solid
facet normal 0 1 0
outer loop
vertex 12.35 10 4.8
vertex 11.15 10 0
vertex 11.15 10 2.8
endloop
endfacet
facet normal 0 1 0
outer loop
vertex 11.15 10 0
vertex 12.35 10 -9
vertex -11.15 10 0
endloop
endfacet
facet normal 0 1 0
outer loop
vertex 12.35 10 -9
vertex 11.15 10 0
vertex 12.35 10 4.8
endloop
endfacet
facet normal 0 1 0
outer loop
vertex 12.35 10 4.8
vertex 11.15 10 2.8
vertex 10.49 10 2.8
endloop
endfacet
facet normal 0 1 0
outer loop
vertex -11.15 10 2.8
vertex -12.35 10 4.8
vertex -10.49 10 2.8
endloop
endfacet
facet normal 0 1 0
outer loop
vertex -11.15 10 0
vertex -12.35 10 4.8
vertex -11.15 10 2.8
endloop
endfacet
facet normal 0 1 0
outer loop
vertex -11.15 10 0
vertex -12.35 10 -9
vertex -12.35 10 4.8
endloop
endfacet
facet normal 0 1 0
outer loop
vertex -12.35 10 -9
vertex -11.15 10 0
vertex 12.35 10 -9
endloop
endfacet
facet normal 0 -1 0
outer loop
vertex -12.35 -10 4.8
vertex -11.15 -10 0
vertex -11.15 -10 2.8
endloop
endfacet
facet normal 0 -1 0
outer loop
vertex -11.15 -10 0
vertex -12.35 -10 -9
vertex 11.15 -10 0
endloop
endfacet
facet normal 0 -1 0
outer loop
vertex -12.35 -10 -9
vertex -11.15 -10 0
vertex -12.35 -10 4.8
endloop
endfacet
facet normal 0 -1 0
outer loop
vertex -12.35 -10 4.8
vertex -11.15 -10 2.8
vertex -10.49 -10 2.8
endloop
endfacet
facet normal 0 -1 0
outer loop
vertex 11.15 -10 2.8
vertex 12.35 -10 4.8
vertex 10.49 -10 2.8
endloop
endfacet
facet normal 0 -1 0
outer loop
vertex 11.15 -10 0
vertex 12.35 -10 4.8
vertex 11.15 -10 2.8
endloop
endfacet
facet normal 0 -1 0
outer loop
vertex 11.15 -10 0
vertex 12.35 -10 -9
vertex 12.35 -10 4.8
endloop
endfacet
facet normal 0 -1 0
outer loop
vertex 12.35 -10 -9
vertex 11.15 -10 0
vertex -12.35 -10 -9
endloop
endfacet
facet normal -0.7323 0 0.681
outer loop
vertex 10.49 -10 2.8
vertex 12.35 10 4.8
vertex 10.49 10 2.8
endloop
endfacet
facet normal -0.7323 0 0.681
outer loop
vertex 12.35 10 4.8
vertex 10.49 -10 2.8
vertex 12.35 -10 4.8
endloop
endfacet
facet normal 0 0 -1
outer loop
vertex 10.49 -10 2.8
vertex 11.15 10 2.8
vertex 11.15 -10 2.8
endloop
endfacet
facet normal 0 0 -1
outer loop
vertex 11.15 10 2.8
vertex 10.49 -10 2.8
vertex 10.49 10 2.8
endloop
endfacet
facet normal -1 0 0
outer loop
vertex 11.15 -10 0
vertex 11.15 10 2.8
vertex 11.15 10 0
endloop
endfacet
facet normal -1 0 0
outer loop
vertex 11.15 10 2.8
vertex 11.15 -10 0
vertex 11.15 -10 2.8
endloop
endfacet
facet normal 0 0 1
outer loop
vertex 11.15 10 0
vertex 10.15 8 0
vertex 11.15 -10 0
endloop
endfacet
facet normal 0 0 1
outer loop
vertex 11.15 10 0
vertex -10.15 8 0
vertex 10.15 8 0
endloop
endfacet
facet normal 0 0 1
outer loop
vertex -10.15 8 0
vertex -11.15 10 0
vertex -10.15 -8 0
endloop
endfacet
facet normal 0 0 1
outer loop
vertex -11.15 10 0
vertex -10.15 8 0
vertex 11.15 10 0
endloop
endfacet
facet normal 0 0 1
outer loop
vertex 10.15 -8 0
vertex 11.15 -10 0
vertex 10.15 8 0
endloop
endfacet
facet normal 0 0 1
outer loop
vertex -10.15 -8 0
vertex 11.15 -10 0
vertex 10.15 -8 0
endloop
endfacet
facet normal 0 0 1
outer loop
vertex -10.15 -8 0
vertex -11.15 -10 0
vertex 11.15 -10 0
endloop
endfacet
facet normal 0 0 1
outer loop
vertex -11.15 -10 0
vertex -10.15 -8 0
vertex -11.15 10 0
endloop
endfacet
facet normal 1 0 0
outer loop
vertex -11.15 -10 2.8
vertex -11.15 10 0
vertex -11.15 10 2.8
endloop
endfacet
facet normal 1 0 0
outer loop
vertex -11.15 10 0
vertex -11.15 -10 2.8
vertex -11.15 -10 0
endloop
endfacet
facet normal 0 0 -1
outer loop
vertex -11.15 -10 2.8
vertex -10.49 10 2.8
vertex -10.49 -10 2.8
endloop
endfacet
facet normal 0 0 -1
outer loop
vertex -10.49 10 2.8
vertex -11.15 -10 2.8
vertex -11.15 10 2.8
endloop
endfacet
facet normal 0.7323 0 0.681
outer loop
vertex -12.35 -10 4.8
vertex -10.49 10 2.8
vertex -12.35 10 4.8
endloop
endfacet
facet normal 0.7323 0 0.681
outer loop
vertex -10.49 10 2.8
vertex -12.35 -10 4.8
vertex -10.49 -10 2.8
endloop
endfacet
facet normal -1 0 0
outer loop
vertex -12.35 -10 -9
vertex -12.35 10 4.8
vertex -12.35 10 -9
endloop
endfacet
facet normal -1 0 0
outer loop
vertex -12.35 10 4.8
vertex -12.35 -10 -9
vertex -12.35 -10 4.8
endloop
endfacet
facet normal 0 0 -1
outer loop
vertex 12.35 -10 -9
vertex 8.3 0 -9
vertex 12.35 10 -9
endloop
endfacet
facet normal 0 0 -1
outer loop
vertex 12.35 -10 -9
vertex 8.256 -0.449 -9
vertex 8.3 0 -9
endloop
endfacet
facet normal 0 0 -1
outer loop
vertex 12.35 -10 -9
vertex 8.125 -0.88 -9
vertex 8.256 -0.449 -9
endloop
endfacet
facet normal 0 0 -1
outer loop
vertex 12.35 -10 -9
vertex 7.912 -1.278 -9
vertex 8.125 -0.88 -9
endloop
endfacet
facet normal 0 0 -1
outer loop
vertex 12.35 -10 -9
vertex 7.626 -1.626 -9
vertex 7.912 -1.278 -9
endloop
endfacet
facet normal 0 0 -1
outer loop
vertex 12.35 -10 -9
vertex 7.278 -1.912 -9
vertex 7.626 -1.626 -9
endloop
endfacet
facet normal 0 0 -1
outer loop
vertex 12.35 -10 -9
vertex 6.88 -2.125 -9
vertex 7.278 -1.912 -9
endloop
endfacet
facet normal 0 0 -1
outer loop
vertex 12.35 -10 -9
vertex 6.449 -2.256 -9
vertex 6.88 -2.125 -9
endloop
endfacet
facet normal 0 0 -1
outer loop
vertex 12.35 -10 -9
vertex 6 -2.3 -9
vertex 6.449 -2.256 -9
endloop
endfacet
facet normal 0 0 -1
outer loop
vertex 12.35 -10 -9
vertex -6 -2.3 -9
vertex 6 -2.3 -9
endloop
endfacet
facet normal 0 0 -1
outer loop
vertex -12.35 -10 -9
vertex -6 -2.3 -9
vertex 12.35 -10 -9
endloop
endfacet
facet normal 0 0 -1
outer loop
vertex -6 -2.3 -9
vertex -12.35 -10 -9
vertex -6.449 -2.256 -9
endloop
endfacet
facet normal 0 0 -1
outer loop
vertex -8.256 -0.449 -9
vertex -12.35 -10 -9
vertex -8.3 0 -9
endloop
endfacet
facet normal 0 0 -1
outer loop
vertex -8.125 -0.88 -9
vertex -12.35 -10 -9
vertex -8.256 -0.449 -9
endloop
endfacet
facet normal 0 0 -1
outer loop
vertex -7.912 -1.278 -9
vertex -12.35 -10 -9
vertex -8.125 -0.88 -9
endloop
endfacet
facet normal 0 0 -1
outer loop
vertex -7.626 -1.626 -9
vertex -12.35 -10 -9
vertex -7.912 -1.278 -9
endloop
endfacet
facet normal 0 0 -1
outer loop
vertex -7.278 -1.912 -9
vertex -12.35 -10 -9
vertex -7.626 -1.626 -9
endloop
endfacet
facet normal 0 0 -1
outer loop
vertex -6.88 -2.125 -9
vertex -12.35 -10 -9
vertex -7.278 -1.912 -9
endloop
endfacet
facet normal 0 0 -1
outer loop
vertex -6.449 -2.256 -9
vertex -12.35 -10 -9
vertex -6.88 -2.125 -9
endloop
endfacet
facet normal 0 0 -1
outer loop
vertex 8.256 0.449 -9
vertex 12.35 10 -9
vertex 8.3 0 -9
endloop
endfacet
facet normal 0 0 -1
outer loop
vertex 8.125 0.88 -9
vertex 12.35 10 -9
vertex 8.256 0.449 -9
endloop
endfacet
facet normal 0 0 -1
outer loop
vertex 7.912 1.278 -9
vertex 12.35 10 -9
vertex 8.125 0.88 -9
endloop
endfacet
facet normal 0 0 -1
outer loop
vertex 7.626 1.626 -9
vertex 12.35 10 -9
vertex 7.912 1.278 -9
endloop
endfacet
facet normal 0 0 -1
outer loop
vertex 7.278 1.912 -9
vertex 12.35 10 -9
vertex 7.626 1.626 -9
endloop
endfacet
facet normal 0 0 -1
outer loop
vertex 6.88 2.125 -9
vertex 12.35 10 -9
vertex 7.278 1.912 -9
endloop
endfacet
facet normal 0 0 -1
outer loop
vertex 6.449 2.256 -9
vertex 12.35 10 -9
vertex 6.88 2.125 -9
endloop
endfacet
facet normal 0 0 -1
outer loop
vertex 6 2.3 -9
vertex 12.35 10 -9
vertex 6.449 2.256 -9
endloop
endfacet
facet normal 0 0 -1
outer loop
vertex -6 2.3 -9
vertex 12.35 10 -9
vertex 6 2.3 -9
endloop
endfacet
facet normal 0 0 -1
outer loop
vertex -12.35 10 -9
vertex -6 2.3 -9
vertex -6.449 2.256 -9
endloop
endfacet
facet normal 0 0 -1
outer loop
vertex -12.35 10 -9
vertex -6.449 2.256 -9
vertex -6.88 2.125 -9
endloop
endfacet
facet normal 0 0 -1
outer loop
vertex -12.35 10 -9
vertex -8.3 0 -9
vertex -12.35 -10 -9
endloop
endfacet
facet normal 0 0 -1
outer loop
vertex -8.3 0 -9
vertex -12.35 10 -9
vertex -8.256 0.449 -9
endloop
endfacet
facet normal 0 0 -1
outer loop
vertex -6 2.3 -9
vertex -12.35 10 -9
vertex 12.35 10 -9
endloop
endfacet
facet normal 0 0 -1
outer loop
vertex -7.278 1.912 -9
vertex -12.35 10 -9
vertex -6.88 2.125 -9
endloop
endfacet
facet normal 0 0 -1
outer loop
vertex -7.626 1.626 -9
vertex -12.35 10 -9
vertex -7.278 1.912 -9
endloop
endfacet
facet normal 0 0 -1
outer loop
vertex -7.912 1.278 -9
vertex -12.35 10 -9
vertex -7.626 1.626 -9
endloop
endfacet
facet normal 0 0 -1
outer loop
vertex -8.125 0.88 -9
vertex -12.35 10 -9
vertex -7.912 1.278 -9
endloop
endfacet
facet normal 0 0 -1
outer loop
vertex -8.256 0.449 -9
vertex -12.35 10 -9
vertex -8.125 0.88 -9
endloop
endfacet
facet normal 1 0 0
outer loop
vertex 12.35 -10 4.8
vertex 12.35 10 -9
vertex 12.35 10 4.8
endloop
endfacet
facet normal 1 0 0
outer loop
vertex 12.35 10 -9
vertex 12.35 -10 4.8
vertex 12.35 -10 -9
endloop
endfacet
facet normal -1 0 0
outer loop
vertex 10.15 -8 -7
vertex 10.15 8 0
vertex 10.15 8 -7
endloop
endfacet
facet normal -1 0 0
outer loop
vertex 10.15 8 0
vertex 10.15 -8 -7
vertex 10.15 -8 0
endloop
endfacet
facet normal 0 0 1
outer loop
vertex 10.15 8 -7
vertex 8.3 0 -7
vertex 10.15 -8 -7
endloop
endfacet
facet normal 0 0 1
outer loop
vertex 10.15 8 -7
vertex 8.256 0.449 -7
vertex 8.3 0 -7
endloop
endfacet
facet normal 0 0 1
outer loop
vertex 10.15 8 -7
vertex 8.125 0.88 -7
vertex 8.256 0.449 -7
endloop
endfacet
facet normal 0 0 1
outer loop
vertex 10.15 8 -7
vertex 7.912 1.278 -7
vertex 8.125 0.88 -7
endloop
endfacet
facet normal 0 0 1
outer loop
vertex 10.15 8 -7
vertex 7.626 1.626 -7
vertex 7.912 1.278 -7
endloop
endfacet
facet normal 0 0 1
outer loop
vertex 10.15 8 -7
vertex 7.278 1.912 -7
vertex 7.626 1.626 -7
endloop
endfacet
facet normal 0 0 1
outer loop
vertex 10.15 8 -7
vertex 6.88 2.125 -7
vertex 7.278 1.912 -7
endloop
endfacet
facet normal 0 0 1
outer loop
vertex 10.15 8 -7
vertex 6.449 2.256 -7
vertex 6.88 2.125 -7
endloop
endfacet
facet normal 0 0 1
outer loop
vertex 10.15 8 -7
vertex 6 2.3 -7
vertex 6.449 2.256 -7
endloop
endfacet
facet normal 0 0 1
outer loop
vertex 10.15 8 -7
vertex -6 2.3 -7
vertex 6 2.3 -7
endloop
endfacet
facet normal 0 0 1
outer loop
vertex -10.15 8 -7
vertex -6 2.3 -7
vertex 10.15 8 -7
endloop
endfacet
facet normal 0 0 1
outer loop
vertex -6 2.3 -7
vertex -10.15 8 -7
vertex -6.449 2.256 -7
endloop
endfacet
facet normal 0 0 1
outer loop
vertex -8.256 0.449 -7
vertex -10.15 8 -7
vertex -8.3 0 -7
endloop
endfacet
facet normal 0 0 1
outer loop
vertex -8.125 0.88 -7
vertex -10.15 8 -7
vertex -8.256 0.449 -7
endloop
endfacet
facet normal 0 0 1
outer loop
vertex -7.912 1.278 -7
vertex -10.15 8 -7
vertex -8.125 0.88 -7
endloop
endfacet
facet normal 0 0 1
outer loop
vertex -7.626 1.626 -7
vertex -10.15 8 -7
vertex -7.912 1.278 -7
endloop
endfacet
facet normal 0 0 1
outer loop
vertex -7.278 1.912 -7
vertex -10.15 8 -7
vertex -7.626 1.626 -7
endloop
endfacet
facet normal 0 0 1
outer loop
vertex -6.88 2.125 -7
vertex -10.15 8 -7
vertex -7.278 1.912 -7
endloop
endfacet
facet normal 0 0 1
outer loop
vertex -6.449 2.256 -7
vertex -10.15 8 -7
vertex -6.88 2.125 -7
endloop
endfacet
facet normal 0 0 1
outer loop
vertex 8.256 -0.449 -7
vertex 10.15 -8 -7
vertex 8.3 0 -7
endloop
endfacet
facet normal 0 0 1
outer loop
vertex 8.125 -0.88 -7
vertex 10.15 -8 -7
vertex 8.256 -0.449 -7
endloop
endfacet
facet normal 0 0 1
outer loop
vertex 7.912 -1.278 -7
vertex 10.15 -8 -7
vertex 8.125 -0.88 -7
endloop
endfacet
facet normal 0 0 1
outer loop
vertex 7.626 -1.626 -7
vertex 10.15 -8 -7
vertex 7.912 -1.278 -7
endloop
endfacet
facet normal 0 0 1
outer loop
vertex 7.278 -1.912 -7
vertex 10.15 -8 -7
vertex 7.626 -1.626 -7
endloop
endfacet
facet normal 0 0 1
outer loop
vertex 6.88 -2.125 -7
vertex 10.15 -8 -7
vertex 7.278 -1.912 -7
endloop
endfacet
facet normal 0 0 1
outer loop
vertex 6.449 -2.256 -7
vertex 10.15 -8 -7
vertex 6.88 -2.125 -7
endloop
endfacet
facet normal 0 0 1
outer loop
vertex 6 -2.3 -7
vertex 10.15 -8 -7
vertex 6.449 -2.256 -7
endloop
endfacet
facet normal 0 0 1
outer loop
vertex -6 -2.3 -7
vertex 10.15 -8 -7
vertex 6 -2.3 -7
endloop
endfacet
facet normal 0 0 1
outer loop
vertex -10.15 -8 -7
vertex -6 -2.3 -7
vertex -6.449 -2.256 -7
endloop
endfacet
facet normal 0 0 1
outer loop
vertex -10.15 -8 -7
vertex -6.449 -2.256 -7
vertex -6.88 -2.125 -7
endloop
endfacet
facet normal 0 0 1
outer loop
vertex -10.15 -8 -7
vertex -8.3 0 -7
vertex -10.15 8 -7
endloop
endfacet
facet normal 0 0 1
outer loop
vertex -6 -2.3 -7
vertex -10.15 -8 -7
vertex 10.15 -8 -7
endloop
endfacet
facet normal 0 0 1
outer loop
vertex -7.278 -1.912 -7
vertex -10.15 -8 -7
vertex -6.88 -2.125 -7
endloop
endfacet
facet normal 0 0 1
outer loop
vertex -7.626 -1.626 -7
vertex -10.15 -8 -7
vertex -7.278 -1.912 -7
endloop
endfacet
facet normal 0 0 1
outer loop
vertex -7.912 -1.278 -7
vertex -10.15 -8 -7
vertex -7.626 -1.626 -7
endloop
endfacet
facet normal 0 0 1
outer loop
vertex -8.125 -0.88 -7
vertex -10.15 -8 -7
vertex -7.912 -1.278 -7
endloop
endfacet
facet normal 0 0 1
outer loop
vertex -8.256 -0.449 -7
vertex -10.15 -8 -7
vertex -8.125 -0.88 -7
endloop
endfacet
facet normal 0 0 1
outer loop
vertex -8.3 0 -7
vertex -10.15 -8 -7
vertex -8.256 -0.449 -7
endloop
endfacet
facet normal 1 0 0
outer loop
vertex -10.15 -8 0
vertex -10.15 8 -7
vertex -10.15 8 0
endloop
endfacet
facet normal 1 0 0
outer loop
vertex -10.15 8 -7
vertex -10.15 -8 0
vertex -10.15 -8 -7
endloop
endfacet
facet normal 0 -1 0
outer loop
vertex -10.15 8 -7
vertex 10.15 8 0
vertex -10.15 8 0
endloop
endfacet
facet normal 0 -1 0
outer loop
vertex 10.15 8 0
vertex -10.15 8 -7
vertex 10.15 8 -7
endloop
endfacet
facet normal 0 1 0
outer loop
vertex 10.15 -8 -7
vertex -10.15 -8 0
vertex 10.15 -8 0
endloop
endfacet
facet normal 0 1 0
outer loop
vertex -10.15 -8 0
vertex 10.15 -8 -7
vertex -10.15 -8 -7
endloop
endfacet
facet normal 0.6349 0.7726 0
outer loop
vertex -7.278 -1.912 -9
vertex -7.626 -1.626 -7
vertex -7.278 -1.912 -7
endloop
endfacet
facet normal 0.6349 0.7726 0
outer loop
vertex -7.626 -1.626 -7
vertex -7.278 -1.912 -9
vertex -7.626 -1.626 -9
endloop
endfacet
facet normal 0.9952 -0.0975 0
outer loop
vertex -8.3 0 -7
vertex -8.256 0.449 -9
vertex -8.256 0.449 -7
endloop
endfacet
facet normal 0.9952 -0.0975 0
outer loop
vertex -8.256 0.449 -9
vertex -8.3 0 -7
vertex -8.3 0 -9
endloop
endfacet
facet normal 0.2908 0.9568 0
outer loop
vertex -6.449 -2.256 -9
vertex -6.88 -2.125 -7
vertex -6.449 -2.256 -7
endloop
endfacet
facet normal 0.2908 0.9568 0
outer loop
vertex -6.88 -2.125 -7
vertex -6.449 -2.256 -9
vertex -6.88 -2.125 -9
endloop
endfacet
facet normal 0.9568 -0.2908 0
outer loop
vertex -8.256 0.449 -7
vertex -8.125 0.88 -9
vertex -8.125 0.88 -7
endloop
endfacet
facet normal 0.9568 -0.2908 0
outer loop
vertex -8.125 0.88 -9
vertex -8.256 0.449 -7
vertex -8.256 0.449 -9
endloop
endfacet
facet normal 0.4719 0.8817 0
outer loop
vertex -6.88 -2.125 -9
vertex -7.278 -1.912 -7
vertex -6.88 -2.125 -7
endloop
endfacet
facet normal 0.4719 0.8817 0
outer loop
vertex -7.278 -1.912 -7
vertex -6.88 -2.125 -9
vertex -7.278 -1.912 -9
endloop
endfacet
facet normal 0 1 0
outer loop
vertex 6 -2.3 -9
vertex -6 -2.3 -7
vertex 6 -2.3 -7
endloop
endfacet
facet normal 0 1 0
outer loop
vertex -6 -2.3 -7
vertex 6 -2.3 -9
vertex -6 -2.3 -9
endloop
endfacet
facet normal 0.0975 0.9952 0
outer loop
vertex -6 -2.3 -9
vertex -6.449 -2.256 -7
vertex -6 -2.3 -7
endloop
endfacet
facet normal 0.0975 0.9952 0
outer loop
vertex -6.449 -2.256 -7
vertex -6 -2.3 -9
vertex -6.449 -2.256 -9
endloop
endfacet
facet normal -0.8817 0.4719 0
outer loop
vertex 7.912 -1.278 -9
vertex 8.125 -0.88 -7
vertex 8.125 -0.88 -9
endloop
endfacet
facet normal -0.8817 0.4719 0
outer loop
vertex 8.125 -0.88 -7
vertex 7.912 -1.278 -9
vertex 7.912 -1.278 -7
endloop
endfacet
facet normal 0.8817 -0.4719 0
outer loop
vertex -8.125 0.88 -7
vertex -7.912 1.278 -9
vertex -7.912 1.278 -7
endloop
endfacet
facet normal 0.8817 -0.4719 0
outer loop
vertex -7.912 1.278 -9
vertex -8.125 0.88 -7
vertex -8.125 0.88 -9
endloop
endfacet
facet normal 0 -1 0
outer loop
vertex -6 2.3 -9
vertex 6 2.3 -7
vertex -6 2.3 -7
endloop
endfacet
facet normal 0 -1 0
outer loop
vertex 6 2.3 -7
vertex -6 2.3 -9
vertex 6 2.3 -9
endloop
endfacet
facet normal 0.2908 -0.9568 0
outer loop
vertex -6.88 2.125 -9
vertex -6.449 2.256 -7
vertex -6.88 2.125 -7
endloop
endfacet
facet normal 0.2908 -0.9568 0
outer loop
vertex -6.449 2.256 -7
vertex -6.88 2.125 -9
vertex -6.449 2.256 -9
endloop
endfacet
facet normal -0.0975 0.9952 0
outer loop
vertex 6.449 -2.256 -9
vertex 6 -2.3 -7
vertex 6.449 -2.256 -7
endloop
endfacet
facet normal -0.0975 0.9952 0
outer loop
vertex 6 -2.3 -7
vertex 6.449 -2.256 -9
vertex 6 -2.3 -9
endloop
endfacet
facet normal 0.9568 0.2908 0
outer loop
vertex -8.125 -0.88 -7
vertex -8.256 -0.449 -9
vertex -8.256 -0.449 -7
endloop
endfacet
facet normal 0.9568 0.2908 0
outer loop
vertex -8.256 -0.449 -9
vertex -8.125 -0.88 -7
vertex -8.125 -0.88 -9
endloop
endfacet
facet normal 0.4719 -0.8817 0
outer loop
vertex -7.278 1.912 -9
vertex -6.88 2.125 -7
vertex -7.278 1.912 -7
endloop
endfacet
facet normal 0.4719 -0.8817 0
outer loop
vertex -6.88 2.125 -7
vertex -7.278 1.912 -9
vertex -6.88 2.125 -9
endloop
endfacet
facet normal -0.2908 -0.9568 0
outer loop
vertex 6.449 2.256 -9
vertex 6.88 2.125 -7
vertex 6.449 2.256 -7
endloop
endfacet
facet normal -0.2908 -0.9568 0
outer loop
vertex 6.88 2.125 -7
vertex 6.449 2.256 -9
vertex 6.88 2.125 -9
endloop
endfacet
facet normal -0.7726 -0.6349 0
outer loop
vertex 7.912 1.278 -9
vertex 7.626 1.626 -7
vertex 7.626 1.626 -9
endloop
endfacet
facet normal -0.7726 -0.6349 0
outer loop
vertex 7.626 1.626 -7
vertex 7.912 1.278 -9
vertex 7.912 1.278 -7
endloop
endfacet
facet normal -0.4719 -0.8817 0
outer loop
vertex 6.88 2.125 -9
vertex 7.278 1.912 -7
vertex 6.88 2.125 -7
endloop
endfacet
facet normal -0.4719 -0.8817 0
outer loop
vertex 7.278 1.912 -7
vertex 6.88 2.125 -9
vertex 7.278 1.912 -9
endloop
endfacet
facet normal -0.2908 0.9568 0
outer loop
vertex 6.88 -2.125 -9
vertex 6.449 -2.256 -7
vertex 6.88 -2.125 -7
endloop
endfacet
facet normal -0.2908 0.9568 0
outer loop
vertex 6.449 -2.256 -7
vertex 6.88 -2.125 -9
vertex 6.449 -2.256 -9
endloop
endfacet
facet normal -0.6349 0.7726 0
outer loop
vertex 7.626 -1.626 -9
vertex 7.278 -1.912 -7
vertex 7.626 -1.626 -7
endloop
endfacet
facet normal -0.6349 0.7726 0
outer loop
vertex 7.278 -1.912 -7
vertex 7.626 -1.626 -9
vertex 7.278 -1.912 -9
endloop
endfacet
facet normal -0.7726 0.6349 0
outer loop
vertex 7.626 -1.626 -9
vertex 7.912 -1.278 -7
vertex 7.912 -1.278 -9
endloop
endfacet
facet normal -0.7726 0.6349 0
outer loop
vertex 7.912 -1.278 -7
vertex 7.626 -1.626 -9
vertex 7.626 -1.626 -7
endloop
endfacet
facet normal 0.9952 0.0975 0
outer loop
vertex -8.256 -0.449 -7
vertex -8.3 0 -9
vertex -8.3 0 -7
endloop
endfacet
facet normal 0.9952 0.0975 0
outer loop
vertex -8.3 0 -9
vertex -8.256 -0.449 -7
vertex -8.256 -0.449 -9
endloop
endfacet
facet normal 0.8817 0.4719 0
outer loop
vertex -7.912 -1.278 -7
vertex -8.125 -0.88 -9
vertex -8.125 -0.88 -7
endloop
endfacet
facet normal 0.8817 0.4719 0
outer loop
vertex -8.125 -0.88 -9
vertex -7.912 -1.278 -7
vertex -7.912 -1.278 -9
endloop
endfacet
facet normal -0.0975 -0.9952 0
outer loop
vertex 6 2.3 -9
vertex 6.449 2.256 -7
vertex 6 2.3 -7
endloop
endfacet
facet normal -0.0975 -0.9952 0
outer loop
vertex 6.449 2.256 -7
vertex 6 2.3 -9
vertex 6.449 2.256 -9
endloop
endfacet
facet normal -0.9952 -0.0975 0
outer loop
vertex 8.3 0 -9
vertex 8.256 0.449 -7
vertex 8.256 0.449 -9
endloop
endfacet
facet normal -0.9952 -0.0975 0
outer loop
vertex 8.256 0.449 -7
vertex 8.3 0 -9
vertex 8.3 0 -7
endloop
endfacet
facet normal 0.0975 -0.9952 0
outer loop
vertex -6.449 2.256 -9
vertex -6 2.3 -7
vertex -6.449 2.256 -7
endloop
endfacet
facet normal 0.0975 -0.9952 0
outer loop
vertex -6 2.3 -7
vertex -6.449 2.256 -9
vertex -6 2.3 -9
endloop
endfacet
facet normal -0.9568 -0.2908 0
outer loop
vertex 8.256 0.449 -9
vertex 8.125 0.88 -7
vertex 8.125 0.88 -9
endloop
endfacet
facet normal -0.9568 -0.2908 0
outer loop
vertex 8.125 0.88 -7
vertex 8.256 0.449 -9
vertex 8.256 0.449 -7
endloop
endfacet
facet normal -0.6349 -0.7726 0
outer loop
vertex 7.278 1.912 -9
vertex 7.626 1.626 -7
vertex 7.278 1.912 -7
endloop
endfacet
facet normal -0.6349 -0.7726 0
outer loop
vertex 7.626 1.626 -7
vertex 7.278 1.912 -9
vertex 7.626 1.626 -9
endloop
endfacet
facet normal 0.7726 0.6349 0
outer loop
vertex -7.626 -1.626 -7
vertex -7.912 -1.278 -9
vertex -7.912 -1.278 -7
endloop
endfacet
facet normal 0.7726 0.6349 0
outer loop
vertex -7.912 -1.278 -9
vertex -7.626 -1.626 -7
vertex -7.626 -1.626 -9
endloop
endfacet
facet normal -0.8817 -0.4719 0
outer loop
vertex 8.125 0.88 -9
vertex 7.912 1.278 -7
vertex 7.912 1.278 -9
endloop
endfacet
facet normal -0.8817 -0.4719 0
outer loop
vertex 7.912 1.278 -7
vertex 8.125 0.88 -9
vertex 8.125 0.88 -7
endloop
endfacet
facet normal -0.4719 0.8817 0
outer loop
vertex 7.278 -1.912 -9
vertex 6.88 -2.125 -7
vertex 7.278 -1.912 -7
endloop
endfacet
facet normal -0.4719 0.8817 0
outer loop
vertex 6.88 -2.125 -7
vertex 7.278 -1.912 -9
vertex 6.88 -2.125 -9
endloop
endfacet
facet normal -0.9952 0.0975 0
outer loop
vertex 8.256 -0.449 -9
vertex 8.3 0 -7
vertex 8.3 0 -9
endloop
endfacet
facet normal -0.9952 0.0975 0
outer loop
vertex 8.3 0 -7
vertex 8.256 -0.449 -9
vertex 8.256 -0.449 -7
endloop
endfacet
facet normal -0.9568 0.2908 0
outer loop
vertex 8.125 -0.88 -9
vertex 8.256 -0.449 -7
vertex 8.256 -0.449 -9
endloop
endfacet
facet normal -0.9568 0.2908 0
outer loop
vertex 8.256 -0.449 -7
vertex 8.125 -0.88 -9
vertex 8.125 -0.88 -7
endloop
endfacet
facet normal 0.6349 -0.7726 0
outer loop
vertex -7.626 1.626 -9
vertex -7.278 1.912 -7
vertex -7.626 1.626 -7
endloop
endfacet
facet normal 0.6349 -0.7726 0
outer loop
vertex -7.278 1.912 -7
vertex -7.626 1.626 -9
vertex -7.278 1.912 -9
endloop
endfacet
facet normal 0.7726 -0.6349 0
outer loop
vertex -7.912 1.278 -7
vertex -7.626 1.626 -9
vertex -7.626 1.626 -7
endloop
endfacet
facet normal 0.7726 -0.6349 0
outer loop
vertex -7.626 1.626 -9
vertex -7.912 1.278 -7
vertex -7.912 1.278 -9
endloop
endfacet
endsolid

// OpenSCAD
$fn=32;
width = 20;
channel_width = 22.3;
latch_height = 2;
overhang = 0.66;
wall_thickness = 2.8;
box_thickness = 9;
bottom_thickness = 2;
screw_hole_radius = 2.3;
screw_hole_width = 12;

outer_x = channel_width/2 + 1.2;

difference() {
  rotate([90,0,0])
  translate([0, 0, -width/2])
  linear_extrude(width)
  polygon([
    [-outer_x, -box_thickness],
    [-outer_x, wall_thickness + latch_height],
    [-channel_width/2 + overhang, wall_thickness],
    [-channel_width/2, wall_thickness],
    [-channel_width/2, 0],
    [channel_width/2, 0],
    [channel_width/2, wall_thickness],
    [channel_width/2 - overhang, wall_thickness],
    [outer_x, wall_thickness + latch_height],
    [outer_x, -box_thickness],
  ]);
    
  translate([0, 0, -box_thickness/2 + bottom_thickness])
  cube([channel_width - 2, width - 4, box_thickness], center=true);


  translate([0, 0, -box_thickness - 1])
  hull() {
    translate([screw_hole_width/2, 0, 0])
    cylinder(h=bottom_thickness+2, r=screw_hole_radius);
    translate([-screw_hole_width/2, 0, 0])
    cylinder(h=bottom_thickness+2, r=screw_hole_radius);
  }
}
